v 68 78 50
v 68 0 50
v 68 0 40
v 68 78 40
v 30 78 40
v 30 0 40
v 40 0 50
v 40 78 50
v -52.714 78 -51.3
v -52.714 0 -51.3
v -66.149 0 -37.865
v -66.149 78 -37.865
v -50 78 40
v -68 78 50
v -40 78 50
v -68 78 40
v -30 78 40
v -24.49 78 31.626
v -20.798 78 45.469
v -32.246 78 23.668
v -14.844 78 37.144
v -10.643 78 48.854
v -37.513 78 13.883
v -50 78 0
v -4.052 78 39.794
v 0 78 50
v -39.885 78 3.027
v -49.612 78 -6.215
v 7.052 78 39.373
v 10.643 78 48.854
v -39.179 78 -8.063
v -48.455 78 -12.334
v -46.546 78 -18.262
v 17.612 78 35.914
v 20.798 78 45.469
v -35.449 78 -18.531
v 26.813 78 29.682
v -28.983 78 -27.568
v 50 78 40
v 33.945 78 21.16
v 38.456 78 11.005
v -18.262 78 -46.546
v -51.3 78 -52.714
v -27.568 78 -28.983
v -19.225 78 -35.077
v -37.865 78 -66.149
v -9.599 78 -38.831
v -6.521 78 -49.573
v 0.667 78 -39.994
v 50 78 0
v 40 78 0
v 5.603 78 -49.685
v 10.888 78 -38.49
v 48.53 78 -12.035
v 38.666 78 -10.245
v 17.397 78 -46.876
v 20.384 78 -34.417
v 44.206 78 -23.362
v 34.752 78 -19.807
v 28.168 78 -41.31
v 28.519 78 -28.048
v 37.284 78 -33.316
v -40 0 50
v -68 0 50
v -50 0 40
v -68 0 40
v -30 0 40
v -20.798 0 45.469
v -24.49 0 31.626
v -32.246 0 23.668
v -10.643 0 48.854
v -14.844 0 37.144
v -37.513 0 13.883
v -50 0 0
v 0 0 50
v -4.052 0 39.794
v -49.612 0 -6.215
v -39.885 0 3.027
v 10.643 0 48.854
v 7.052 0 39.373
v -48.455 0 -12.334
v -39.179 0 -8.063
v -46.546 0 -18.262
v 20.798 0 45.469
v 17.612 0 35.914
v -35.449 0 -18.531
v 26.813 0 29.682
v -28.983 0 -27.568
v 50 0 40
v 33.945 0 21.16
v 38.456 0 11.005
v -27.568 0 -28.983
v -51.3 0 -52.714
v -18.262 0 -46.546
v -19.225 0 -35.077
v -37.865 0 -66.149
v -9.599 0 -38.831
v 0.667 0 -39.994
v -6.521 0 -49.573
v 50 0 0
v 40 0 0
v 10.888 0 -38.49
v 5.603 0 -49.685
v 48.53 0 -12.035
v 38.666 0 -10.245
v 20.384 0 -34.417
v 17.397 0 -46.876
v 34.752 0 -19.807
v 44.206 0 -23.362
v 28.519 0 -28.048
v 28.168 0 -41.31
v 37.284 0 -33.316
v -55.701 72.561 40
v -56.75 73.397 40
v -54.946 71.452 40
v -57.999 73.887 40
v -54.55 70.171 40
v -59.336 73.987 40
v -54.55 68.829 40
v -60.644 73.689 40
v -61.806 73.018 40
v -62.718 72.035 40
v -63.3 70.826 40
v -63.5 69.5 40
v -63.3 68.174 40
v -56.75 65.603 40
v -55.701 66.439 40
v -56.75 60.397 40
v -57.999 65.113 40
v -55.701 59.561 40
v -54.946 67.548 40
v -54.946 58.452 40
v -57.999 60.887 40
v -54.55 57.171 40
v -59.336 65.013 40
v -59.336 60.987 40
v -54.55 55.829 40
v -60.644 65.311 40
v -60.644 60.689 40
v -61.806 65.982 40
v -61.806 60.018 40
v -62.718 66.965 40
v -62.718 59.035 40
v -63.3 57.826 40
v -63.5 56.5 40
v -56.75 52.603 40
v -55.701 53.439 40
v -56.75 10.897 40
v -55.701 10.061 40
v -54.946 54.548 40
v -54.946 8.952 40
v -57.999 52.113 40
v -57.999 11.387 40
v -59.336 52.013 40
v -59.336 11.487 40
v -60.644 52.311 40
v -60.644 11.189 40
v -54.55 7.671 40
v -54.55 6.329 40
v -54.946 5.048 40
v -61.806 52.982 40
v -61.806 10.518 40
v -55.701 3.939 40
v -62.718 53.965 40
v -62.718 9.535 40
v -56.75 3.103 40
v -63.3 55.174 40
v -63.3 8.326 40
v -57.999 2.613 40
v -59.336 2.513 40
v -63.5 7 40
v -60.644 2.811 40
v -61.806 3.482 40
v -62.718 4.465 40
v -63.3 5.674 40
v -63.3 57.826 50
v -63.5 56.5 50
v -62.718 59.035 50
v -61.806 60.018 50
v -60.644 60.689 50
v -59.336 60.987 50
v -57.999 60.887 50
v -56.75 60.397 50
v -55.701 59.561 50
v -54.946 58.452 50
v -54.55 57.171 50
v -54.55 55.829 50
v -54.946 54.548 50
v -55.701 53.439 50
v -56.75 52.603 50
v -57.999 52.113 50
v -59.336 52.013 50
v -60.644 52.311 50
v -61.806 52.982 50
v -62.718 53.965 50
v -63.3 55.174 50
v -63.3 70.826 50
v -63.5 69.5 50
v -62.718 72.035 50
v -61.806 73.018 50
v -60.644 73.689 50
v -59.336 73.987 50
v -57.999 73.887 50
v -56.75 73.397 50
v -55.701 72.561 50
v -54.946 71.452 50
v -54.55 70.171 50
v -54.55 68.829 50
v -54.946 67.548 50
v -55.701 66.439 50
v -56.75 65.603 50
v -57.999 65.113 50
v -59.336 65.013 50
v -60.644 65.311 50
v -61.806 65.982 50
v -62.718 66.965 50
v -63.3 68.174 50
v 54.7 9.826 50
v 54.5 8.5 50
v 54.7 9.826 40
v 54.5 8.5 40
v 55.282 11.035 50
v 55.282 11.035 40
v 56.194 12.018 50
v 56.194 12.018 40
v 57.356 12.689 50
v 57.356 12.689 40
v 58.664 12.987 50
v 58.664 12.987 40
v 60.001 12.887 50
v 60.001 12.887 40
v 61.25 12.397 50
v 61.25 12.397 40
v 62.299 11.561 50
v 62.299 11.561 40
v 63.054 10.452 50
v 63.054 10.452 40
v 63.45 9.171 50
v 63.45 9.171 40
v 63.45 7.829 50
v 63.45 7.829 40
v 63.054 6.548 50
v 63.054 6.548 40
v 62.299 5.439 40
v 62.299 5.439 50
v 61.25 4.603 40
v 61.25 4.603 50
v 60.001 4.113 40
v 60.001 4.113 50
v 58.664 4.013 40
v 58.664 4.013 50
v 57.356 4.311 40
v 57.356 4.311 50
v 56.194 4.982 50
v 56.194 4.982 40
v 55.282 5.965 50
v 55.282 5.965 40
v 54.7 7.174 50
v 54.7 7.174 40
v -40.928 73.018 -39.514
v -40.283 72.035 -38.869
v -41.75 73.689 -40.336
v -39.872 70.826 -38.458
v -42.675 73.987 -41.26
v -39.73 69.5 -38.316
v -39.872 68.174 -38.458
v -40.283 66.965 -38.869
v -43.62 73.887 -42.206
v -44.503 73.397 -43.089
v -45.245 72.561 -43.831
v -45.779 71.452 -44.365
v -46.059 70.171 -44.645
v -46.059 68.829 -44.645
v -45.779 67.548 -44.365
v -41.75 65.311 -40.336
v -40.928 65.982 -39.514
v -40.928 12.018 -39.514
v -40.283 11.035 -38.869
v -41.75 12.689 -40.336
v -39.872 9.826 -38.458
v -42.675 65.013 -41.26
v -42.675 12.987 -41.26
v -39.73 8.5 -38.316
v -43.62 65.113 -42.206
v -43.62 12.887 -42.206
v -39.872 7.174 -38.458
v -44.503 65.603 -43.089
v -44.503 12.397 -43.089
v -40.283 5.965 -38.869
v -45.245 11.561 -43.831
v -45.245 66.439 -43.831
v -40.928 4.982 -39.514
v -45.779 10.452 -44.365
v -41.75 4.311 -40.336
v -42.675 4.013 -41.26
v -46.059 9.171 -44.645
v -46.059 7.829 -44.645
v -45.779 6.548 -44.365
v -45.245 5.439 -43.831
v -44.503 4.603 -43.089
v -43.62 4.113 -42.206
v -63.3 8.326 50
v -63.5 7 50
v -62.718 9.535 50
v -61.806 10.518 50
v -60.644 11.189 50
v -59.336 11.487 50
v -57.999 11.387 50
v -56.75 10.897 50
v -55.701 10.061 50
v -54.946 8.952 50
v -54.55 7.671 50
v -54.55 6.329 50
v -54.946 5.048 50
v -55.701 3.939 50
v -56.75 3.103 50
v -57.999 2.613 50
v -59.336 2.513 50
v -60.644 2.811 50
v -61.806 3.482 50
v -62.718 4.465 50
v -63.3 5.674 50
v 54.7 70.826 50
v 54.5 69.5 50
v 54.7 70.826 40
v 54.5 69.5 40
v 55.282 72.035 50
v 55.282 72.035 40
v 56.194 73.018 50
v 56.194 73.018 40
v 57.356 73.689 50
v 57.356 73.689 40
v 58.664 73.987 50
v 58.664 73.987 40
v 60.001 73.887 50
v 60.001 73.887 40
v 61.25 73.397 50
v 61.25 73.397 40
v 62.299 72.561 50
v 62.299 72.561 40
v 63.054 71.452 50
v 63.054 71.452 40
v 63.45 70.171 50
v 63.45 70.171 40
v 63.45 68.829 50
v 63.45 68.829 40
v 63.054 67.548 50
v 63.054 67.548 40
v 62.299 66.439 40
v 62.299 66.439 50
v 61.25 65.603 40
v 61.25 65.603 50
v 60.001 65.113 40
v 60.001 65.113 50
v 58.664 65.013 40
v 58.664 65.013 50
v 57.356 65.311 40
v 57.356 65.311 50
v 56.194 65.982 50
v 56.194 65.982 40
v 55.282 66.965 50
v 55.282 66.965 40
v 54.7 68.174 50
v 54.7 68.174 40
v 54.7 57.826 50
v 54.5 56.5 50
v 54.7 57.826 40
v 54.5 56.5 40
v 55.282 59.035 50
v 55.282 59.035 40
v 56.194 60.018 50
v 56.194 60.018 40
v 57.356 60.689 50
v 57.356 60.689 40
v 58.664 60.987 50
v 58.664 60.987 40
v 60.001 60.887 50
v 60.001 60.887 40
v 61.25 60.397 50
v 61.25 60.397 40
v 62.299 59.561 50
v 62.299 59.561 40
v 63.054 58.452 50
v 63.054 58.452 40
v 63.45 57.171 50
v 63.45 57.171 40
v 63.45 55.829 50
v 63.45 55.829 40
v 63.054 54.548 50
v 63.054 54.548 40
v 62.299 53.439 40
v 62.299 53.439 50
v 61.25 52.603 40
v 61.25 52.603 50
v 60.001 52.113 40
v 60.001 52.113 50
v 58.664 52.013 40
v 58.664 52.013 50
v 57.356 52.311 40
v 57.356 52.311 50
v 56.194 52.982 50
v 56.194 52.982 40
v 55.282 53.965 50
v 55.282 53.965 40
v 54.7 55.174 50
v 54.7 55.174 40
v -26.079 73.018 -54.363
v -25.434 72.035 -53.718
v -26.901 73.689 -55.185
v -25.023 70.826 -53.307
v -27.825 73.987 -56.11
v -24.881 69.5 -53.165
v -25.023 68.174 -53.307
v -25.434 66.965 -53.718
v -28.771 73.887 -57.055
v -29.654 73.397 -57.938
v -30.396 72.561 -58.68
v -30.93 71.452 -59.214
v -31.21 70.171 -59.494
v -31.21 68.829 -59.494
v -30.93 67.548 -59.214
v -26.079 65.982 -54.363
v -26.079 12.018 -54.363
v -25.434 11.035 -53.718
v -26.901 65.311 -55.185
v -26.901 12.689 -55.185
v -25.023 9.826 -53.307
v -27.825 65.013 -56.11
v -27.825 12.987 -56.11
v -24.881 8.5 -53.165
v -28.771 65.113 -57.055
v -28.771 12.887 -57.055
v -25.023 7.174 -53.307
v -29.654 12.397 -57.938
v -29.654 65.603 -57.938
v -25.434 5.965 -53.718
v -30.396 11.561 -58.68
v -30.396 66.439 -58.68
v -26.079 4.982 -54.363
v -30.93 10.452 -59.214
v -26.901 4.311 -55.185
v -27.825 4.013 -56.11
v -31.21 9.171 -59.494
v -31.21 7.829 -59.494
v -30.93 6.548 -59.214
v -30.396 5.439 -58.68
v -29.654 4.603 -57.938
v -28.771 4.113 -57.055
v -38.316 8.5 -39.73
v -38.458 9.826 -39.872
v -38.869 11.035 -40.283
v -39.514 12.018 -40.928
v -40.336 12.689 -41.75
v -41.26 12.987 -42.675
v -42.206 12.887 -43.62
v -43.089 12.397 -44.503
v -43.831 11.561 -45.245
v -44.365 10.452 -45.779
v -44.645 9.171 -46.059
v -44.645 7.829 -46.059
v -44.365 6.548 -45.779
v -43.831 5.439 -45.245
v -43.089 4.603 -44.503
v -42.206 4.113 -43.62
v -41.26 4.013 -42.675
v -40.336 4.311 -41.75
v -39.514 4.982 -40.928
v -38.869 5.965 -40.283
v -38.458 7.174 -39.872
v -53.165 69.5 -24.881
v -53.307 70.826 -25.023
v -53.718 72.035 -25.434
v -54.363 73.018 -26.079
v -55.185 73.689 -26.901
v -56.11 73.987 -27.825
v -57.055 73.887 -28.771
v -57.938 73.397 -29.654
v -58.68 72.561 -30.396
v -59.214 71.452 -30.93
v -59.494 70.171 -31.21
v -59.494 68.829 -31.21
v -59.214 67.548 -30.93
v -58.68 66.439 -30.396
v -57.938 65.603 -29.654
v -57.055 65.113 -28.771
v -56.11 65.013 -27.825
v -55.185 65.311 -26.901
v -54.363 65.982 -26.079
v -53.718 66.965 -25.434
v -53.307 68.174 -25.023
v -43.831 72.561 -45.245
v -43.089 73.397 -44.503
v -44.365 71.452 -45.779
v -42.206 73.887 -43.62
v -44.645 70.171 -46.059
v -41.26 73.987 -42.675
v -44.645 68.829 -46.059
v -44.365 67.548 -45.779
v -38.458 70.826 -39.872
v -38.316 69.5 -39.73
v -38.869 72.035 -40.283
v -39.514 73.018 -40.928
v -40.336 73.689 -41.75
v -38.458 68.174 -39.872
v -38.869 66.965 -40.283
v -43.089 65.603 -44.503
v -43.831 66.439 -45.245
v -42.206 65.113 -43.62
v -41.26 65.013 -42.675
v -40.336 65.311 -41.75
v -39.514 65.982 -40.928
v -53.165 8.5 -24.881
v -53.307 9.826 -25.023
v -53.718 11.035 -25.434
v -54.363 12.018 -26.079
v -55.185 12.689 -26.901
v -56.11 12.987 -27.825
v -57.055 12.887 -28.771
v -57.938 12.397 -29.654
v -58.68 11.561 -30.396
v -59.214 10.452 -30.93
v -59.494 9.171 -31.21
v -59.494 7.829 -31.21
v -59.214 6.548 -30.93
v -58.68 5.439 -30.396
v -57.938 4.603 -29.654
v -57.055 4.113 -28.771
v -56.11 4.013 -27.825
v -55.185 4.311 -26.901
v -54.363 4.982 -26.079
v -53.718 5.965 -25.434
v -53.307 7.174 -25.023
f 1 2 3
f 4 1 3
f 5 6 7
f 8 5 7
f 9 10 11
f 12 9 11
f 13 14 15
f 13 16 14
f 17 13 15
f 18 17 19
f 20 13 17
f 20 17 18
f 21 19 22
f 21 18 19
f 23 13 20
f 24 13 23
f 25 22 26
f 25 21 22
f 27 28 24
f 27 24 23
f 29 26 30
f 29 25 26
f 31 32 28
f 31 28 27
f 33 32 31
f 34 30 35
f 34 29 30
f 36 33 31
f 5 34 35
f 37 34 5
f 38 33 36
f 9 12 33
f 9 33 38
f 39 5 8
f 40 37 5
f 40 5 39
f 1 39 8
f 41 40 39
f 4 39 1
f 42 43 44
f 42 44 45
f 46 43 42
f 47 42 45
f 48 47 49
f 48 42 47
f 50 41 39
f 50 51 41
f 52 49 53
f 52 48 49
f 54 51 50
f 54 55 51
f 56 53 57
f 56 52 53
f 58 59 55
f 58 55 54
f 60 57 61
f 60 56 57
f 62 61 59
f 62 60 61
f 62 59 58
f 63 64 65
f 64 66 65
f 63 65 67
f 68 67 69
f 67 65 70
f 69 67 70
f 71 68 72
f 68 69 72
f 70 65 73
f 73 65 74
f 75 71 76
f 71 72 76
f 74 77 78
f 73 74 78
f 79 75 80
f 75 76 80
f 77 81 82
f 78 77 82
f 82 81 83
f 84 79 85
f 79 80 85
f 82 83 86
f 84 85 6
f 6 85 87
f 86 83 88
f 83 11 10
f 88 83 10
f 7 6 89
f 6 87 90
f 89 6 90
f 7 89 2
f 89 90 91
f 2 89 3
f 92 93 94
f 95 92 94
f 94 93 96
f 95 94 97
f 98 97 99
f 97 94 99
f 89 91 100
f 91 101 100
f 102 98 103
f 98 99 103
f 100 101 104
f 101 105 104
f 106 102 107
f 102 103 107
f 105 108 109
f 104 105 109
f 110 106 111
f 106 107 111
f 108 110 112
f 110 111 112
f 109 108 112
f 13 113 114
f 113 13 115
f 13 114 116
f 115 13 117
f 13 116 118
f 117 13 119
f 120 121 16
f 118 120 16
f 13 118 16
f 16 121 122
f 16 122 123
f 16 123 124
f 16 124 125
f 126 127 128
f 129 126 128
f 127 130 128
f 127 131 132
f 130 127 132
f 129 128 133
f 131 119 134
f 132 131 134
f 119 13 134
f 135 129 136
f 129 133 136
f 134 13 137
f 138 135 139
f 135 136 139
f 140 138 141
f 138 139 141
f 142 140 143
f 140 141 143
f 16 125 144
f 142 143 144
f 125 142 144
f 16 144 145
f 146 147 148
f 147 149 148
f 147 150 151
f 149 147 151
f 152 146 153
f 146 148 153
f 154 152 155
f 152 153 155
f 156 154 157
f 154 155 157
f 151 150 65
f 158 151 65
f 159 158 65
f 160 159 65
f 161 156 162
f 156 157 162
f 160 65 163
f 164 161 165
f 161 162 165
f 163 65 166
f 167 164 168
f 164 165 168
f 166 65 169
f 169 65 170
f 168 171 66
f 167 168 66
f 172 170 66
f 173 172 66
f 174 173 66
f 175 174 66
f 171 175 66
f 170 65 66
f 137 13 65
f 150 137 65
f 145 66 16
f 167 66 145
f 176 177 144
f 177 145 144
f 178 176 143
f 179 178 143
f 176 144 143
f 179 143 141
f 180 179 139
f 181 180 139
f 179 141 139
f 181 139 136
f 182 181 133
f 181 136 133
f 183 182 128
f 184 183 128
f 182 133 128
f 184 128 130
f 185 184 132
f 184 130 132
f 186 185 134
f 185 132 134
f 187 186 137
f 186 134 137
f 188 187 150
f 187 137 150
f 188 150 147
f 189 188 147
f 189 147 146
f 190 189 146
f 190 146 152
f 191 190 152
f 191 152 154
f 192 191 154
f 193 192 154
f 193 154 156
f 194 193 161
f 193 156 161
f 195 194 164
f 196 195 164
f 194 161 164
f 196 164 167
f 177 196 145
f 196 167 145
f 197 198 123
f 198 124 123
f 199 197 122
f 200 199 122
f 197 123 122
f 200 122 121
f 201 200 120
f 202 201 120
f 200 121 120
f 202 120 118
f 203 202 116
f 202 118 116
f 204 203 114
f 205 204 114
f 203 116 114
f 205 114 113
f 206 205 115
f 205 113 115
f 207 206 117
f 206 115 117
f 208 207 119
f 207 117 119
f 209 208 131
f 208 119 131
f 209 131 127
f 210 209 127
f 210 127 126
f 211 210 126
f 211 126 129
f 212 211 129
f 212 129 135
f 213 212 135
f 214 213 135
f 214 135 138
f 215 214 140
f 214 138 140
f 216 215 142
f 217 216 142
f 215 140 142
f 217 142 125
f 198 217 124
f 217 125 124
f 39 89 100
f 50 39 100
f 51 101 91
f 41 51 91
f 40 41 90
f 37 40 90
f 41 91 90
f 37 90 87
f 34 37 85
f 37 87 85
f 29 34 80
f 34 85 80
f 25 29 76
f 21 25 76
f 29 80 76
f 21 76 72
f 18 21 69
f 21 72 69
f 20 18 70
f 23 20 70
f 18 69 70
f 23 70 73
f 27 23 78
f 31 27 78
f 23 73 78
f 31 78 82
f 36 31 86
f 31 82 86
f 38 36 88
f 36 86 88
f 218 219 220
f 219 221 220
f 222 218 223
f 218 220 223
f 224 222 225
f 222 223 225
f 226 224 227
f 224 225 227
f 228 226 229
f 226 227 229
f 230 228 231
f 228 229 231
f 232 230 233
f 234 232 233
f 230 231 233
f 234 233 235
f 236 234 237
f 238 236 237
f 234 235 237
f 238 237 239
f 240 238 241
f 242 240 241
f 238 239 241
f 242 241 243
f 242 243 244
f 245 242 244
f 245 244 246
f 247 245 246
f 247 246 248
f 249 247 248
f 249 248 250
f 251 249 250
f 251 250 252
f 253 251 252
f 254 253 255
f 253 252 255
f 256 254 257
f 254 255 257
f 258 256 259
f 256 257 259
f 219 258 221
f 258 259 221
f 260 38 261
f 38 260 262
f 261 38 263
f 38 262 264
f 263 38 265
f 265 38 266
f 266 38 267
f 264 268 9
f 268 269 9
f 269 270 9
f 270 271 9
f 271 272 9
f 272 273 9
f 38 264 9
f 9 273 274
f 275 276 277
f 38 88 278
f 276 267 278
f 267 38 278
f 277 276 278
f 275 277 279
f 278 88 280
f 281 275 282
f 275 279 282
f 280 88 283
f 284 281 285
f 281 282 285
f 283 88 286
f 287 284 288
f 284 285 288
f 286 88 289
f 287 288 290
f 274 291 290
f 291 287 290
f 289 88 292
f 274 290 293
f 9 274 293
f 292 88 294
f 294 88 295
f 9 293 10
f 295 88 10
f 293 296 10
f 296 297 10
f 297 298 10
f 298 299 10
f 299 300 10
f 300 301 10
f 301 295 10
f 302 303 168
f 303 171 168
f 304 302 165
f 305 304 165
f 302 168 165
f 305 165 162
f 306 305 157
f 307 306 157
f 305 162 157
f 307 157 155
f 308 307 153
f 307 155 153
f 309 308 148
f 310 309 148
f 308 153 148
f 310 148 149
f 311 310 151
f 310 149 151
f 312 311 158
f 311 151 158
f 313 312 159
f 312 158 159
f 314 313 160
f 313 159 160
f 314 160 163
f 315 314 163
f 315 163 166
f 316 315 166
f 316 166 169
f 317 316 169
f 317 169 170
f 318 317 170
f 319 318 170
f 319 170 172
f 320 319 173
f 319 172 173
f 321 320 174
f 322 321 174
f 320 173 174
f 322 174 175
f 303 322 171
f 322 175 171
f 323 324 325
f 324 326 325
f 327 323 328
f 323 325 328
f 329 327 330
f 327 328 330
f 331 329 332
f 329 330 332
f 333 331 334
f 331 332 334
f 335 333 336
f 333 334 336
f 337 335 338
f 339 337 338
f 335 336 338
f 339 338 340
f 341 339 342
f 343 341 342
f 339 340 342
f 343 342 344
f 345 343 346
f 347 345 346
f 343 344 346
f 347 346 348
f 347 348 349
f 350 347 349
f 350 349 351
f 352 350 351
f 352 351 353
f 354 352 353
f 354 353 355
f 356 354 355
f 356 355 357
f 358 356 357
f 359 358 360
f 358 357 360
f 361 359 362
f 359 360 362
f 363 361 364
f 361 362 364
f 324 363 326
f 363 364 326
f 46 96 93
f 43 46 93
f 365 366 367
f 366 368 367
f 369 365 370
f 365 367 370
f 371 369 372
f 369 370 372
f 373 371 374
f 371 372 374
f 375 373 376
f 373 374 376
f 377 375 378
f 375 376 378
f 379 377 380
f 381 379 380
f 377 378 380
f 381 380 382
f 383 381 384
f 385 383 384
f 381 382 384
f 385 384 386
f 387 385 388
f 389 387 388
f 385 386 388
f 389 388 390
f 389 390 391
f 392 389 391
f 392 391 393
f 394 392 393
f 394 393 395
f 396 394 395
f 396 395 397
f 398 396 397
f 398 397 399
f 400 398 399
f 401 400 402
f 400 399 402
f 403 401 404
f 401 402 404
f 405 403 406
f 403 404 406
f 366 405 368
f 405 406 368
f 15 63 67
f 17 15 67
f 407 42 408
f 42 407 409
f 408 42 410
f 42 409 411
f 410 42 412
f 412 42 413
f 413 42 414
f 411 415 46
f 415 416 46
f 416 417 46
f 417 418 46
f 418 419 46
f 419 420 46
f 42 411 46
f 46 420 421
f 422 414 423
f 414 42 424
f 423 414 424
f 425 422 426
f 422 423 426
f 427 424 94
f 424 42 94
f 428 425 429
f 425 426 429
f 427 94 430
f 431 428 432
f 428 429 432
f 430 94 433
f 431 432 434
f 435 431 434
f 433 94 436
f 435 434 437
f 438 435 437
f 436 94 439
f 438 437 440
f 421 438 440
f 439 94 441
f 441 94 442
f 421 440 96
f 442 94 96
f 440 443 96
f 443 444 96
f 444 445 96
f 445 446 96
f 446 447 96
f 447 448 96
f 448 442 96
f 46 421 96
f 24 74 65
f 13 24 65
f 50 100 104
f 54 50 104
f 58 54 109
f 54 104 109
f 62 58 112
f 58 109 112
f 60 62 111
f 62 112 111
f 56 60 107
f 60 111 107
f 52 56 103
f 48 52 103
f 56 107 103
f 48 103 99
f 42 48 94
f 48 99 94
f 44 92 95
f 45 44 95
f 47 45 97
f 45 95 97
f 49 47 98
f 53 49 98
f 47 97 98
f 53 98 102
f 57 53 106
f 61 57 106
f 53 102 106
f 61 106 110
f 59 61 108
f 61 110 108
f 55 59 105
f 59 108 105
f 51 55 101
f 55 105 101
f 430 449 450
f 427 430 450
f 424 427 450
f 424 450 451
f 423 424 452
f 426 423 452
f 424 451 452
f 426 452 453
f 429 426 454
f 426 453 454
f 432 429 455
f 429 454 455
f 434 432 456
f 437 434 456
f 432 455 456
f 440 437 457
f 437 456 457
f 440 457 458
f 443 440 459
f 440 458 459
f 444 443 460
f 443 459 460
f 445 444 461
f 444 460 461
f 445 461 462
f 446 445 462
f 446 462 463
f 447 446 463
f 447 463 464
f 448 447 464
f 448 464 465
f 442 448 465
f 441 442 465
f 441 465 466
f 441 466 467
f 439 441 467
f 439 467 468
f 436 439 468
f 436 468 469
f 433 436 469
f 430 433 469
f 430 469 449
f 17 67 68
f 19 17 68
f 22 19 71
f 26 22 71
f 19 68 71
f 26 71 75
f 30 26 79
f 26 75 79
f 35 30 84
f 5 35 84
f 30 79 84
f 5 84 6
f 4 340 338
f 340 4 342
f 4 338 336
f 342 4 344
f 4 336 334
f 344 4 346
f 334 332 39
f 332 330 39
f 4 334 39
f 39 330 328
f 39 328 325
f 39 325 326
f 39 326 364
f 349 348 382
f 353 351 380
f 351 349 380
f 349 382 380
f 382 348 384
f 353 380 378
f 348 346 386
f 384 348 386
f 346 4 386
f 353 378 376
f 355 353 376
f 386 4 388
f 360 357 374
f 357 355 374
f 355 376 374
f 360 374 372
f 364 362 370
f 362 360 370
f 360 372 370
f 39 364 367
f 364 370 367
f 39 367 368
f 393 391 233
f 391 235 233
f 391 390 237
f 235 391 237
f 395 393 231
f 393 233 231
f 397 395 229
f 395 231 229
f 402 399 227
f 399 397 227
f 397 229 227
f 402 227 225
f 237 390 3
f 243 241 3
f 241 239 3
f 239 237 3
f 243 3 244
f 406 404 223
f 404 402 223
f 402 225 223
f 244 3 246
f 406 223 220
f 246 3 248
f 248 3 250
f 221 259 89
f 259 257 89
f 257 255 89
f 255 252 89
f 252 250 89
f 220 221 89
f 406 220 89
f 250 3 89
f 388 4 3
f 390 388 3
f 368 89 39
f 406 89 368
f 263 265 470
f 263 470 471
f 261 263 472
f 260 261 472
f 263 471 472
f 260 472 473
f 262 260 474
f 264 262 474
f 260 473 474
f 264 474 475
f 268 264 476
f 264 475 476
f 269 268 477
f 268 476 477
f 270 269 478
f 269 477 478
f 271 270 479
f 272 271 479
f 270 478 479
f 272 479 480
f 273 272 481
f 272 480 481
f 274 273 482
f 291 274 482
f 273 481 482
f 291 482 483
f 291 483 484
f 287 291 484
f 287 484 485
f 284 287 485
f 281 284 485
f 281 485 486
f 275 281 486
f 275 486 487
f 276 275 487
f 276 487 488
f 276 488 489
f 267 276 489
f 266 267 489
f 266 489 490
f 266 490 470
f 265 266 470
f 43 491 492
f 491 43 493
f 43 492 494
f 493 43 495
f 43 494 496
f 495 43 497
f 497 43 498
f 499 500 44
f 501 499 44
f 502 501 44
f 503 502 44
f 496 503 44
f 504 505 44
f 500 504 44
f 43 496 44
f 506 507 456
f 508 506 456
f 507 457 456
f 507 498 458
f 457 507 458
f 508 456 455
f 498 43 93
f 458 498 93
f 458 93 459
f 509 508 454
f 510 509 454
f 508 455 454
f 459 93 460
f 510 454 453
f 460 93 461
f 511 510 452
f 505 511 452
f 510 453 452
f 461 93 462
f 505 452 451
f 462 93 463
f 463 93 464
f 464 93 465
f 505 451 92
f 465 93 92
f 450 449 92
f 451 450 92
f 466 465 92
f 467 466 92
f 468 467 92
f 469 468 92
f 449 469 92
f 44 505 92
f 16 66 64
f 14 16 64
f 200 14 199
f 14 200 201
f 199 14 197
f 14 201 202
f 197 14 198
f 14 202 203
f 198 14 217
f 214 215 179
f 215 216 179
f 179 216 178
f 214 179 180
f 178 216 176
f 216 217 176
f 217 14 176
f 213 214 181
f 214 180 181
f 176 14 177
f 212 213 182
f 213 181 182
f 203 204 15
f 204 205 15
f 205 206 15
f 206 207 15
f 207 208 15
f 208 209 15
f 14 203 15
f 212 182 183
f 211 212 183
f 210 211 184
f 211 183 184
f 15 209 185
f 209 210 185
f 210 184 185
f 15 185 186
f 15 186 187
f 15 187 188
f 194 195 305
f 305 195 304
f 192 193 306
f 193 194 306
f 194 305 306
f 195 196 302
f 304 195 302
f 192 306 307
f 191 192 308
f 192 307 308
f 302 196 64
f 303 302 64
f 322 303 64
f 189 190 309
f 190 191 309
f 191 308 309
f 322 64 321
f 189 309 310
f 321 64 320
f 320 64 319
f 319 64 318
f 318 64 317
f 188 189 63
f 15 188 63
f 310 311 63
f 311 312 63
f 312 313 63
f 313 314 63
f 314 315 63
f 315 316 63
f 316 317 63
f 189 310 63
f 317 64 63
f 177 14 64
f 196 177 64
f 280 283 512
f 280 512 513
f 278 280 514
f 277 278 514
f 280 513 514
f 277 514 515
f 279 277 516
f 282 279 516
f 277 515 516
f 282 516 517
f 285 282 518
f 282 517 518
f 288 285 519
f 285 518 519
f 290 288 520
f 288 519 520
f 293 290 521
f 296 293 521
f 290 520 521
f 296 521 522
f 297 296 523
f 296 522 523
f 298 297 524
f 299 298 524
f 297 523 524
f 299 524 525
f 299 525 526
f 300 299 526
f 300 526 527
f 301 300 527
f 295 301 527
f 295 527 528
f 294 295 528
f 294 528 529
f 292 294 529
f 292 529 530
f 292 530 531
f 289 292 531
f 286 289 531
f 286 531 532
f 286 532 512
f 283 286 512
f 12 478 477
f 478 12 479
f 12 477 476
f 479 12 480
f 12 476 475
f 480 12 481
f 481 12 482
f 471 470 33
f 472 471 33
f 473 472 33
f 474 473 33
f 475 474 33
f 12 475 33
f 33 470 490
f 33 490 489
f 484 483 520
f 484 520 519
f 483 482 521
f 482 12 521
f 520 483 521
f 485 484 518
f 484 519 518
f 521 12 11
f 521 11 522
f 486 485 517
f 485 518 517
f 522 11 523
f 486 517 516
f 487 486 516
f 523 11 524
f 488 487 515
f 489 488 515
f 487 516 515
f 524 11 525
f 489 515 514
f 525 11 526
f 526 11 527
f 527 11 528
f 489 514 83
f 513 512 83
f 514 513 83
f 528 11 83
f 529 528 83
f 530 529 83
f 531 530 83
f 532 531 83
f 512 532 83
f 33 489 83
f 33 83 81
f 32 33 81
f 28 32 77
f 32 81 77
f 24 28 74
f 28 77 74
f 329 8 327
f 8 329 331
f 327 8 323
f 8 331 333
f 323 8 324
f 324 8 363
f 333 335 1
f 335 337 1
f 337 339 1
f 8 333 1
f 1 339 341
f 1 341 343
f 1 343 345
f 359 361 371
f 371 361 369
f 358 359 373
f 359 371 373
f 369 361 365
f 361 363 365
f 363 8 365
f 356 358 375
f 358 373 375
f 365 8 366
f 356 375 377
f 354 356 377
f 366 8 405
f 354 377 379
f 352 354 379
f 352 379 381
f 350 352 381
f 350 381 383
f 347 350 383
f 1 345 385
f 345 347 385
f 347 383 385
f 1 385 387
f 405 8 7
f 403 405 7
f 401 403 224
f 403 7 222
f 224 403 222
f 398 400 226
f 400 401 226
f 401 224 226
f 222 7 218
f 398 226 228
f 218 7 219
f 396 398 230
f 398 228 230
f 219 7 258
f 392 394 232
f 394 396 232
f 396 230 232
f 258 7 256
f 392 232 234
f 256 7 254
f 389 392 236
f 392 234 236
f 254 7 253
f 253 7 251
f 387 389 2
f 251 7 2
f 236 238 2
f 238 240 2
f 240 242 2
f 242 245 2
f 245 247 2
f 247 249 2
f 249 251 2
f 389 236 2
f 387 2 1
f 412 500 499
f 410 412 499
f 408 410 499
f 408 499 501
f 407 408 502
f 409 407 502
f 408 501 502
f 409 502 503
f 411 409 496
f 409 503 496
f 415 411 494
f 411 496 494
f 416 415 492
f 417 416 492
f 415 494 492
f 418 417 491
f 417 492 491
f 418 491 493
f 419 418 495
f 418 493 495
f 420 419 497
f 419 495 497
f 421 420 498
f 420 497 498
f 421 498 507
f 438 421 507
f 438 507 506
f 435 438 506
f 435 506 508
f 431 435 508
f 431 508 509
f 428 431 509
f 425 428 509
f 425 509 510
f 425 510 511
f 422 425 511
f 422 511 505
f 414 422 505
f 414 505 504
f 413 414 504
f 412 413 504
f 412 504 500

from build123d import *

# Parameters (mm, degrees)
BOSS_EXTRUDE2_DEPTH      = 78
M8_CLEARANCE_HOLE1_D     = 9
M8_CLEARANCE_HOLE1_DEPTH = 10
M8_CLEARANCE_HOLE1_TIP   = 2.703872786
M8_CLEARANCE_HOLE2_D     = 9


with BuildPart() as part:
    # Sketch1 → Boss-Extrude2 (new body)
    with BuildSketch(Plane(origin=(0, 0, 0), x_dir=(1, 0, 0), z_dir=(0, 1, 0))):
        with BuildLine():
            Line((-68, -50), (-50, -50))
            Line((-50, -50), (-40, -50))
            Line((-40, -50), (-30, -40))
            ThreePointArc((-30, -40), (0, -50), (30, -40))
            Line((30, -40), (40, -50))
            Line((40, -50), (50, -50))
            Line((50, -50), (68, -50))
            Line((68, -50), (68, -40))
            Line((68, -40), (50, -40))
            Line((50, -40), (50, 0))
            ThreePointArc((50, 0), (28.168436295, 41.310279553), (-18.261567868, 46.545839116))
            Line((-18.261567868, 46.545839116), (-37.864743155, 66.149014403))
            Line((-37.864743155, 66.149014403), (-51.299771998, 52.71398556))
            Line((-51.299771998, 52.71398556), (-27.56832425, 28.982537812))
            ThreePointArc((-27.56832425, 28.982537812), (15.76811704, 36.760936944), (40, 0))
            ThreePointArc((40, 0), (-14.84416531, -37.143650282), (-28.982537812, 27.56832425))
            Line((-28.982537812, 27.56832425), (-52.71398556, 51.299771998))
            Line((-52.71398556, 51.299771998), (-66.149014403, 37.864743155))
            Line((-66.149014403, 37.864743155), (-46.545839116, 18.261567868))
            ThreePointArc((-46.545839116, 18.261567868), (-49.128871124, 9.292686485), (-50, 0))
            Line((-50, 0), (-50, -40))
            Line((-50, -40), (-68, -40))
            Line((-68, -40), (-68, -50))
        make_face()
    extrude(amount=BOSS_EXTRUDE2_DEPTH)

    # M8 Clearance Hole1
    with Locations(Plane.XY.offset(50)):
        with Locations((-59, 69.5), (-59, 7), (-59, 56.5), (59, 56.5), (59, 8.5), (59, 69.5)):
            Hole(M8_CLEARANCE_HOLE1_D / 2, depth=M8_CLEARANCE_HOLE1_DEPTH)
            with Locations((0, 0, -(M8_CLEARANCE_HOLE1_DEPTH + M8_CLEARANCE_HOLE1_TIP / 2))):  # 118° drill point
                Cone(0, M8_CLEARANCE_HOLE1_D / 2, M8_CLEARANCE_HOLE1_TIP, mode=Mode.SUBTRACT)

    # M8 Clearance Hole2 (through all)
    with Locations(Plane(origin=(14.142135624, 0, -14.142135624), x_dir=(-0.707106781, 0, -0.707106781), z_dir=(0.707106781, 0, -0.707106781))):
        with Locations((59.687295128, 8.5), (59.687295128, 69.5)):
            Hole(M8_CLEARANCE_HOLE2_D / 2)


solid = part.part
